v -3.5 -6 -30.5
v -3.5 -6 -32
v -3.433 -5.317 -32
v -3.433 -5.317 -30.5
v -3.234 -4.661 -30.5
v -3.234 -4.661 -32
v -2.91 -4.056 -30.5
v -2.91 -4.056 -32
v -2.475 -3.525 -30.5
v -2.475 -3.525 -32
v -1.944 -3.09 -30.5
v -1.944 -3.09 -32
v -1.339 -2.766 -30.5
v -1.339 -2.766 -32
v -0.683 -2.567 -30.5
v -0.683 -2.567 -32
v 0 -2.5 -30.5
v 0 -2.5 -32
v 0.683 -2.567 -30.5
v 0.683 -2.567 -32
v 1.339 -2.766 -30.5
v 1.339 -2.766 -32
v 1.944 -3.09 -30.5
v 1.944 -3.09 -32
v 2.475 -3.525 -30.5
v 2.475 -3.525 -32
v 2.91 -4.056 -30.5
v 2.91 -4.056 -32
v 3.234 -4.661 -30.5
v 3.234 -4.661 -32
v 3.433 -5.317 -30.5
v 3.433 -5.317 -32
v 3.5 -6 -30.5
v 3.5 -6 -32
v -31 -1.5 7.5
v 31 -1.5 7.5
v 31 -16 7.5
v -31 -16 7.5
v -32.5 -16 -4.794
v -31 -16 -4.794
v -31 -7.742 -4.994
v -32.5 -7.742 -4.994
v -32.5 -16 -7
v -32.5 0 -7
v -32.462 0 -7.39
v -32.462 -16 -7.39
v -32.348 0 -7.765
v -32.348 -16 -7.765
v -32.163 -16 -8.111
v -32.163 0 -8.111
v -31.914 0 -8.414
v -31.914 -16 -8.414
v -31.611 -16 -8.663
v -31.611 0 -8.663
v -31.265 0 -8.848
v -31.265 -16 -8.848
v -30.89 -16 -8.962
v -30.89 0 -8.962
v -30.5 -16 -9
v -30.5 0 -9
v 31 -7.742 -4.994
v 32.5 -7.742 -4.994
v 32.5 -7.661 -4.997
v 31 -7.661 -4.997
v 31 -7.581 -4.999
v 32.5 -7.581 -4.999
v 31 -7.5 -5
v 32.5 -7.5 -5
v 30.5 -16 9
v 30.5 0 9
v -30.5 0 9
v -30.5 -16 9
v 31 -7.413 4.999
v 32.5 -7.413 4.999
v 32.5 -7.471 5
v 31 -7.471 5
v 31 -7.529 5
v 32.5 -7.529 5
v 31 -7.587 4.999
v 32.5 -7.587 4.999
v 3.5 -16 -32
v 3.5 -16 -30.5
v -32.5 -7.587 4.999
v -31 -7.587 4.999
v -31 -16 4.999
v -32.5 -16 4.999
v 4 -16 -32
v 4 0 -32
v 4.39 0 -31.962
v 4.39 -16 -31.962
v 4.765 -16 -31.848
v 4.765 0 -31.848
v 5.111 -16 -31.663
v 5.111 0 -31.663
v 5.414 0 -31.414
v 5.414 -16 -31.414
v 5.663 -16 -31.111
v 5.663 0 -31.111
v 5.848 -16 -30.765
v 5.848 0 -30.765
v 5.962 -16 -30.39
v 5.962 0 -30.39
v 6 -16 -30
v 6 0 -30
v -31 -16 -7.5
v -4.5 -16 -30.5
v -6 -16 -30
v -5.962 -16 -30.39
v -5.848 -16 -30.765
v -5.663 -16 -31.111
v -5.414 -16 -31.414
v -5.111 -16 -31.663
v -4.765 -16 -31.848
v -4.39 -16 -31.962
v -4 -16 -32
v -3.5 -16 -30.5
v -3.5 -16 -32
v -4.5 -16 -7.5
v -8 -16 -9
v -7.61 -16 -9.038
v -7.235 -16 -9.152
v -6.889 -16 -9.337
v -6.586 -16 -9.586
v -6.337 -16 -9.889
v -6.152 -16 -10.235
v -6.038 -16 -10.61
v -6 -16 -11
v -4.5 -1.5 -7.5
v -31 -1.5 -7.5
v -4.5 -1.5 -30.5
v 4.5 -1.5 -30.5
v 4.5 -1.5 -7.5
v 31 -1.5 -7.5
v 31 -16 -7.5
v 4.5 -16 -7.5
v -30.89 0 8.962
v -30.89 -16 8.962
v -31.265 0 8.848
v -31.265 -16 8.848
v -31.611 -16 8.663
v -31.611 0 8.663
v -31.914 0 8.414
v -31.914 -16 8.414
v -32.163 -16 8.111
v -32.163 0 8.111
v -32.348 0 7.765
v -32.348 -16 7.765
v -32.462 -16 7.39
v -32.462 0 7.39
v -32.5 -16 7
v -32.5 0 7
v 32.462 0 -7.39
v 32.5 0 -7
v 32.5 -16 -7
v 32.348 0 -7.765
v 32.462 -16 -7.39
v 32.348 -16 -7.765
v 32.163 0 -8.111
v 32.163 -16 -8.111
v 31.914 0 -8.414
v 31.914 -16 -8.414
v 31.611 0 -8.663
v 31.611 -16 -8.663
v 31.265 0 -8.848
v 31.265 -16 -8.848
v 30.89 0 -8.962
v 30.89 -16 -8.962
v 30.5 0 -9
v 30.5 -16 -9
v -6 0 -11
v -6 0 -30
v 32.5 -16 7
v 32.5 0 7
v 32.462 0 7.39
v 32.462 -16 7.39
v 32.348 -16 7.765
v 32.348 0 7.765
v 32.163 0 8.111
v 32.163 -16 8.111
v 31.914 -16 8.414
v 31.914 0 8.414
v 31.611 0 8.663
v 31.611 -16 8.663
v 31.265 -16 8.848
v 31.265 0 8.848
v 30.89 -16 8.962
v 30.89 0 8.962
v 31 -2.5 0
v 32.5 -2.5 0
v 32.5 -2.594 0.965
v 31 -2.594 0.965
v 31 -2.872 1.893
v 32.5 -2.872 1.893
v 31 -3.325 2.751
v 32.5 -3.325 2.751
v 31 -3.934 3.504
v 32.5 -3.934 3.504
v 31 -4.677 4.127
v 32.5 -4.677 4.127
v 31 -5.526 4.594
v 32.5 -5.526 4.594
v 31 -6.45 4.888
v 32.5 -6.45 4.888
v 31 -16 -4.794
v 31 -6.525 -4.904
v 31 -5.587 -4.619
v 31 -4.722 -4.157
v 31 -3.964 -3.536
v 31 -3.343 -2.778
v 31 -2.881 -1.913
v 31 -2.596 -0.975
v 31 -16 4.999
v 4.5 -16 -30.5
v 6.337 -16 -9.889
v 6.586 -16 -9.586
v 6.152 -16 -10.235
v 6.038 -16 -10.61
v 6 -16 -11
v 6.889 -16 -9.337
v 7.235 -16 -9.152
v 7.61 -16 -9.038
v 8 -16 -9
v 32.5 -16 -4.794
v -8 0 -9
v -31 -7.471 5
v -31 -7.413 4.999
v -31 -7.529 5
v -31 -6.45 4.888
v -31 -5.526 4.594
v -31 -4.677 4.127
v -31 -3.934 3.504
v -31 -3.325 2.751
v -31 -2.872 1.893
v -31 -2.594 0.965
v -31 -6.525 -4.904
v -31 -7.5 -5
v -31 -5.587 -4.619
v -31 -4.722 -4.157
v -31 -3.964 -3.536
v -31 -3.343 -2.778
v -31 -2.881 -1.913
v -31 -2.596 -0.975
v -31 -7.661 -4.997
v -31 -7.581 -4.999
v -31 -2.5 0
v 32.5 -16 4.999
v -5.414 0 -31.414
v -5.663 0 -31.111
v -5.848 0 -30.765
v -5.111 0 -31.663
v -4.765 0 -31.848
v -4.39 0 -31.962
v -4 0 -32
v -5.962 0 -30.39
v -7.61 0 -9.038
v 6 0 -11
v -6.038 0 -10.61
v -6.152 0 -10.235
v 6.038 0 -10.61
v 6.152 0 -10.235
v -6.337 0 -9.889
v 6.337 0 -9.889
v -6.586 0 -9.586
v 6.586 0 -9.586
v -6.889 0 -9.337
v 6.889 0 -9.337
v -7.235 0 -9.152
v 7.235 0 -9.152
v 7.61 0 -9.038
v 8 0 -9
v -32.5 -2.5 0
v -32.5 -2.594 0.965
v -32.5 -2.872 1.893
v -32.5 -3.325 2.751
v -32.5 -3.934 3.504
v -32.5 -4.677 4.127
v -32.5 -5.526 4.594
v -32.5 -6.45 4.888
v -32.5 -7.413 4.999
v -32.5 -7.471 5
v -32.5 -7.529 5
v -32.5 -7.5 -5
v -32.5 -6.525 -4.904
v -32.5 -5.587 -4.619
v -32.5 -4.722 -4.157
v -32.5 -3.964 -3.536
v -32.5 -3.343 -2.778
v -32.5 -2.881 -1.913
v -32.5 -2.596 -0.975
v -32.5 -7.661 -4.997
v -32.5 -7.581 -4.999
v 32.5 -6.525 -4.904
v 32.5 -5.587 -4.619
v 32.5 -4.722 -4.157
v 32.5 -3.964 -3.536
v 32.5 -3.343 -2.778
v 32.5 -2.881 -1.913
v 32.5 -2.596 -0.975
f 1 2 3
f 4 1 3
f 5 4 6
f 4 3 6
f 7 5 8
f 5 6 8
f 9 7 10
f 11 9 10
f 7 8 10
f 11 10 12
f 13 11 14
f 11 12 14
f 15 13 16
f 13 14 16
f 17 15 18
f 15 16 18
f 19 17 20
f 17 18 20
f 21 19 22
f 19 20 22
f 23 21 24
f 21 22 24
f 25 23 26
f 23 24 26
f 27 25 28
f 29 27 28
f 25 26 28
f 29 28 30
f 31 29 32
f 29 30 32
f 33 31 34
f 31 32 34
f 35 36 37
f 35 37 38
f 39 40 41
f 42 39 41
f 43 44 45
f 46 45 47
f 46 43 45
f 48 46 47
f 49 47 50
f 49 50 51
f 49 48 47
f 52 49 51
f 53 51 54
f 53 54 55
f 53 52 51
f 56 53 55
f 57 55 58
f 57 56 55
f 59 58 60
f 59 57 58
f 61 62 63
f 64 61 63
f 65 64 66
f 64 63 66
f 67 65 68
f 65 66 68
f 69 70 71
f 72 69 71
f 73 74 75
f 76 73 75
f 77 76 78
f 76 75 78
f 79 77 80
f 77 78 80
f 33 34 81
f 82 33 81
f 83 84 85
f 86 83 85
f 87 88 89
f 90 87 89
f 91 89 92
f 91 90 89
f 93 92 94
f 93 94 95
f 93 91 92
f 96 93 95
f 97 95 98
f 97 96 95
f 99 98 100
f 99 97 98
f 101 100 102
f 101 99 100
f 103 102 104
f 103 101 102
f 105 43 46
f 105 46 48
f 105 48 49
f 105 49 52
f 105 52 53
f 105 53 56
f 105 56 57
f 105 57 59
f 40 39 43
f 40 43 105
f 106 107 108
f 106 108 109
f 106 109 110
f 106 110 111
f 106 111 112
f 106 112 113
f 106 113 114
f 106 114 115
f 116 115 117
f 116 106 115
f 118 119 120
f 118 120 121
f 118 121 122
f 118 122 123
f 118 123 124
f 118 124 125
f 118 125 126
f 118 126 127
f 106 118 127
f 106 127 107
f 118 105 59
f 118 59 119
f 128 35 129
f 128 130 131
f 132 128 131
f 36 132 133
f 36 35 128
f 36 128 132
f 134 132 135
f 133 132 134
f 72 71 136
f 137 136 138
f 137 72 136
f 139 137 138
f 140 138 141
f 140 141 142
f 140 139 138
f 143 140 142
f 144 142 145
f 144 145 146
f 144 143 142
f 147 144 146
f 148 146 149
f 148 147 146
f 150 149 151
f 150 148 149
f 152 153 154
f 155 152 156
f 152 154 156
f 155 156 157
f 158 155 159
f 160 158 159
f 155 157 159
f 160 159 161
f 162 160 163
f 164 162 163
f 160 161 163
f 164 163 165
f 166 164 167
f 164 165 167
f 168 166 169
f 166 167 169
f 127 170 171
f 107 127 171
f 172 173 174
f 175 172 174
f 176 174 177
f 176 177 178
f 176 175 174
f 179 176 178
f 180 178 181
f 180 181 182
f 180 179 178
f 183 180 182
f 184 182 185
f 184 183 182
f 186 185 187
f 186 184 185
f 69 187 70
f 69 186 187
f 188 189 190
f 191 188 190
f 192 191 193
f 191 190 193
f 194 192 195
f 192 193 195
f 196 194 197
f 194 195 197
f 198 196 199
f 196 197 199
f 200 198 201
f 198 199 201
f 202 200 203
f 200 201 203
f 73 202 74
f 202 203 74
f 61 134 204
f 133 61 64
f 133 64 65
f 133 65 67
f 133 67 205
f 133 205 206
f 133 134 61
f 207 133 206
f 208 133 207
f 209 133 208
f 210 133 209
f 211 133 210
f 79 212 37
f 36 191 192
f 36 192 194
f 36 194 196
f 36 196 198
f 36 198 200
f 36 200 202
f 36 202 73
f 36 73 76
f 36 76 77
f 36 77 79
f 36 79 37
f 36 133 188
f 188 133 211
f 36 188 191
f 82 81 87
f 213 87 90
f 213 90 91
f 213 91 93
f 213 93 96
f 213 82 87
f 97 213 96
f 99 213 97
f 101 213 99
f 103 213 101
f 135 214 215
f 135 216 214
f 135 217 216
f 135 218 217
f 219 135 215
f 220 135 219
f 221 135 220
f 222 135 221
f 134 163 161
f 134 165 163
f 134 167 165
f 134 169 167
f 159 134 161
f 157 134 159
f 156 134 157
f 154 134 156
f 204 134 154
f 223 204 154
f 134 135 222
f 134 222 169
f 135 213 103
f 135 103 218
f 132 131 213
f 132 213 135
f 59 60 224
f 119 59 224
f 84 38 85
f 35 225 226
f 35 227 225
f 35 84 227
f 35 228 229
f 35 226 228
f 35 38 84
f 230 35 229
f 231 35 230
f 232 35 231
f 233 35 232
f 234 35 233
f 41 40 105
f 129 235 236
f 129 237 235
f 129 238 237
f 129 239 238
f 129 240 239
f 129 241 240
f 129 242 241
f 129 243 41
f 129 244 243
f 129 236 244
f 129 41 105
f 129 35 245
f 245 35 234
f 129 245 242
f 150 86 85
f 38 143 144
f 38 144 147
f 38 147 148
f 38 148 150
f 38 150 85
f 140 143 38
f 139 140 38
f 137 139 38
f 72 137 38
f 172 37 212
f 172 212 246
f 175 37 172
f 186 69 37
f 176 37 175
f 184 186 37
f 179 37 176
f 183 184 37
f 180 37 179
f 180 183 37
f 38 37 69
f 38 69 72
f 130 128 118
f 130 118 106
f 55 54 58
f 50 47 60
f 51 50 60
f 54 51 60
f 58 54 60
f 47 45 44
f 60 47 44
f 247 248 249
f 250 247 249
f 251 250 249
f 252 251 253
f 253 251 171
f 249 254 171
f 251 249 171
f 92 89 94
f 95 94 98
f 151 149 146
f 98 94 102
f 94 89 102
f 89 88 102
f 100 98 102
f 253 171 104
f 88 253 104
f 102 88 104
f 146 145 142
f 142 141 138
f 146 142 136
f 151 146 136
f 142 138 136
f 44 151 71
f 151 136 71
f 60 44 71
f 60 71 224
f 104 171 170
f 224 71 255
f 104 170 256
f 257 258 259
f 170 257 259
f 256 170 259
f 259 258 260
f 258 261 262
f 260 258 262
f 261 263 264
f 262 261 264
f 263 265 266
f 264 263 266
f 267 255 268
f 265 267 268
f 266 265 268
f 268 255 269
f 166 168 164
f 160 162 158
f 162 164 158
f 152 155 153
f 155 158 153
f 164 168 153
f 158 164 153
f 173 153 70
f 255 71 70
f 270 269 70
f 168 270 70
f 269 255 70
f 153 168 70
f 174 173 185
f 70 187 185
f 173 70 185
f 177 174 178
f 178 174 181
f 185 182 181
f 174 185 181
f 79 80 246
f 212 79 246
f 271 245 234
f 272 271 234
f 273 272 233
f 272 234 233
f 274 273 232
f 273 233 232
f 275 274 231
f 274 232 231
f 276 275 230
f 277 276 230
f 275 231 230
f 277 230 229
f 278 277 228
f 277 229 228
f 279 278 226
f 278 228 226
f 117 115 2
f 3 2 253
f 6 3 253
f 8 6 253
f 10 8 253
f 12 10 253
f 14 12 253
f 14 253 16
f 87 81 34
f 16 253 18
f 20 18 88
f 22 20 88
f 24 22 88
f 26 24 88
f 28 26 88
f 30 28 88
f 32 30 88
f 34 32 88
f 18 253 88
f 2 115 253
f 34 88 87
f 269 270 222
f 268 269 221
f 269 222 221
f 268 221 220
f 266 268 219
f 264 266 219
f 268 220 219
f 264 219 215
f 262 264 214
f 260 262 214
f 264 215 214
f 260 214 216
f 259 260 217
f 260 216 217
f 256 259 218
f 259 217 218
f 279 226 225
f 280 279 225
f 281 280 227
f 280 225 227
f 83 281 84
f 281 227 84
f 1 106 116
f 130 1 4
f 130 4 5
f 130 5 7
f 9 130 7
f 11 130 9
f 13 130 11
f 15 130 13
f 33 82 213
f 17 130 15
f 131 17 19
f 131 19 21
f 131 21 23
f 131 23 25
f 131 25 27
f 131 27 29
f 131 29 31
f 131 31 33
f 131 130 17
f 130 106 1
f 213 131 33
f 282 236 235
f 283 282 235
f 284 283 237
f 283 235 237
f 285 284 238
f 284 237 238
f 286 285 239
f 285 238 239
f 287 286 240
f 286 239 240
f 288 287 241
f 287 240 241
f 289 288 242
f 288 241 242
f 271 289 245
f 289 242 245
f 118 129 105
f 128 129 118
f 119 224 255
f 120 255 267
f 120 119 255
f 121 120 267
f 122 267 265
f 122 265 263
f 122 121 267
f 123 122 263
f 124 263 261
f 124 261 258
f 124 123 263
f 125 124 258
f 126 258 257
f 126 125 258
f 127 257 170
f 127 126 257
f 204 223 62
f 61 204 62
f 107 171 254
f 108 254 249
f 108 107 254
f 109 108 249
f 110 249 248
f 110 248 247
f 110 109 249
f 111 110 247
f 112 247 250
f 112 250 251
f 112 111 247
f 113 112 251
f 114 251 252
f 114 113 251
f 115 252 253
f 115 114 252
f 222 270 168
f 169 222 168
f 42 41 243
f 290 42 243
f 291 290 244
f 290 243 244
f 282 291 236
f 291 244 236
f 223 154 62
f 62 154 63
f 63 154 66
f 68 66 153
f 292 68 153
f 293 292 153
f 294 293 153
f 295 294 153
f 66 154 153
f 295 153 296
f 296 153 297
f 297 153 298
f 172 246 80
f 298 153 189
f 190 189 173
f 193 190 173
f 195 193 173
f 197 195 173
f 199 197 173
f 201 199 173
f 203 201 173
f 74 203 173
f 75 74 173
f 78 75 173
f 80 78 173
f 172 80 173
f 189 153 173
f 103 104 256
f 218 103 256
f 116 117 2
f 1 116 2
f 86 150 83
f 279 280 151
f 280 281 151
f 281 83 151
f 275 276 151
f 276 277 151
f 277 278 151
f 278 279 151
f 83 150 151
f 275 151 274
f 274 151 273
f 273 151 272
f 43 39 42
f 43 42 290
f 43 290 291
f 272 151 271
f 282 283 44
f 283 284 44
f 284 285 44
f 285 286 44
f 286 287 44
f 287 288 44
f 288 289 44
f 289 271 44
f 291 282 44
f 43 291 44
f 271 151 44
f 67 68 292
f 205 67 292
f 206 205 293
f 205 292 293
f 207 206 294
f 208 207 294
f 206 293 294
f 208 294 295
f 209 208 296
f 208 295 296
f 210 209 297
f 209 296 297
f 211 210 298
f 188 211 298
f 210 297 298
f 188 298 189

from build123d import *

# Parameters (mm, degrees)
F1_DEPTH = 16
F2_T     = -1.5
F4_DEPTH = 100
F6_DEPTH = 25
F7_R     = 2


with BuildPart() as f1:
    # F0 (on Front) → F1 (new body)
    with BuildSketch(Plane.XZ):
        Polygon((32.5, -9), (32.5, 9), (-32.5, 9), (-32.5, -9), (-6, -9), (-6, -32), (6, -32), (6, -9), align=None)
    extrude(amount=F1_DEPTH)

    # F2
    f2_openings = [f1.faces().sort_by_distance(p)[0] for p in [
        (0, -16, -3.912863),
    ]]
    offset(amount=F2_T, openings=f2_openings, kind=Kind.INTERSECTION)

    # F3 (on face) → F4 (cut)
    with BuildSketch(Plane.YZ.offset(32.5)):
        with BuildLine():
            ThreePointArc((-7.5, -5), (-3.9644660941, -3.5355339059), (-2.5, 0))
            ThreePointArc((-2.5, 0), (-3.9336885694, 3.5044860935), (-7.4125691119, 4.9992355255))
            Line((-7.4125691119, 4.9992355255), (-7.5874308881, 4.9992355255))
            ThreePointArc((-7.5874308881, 4.9992355255), (-12.4994020552, 0.0773245797), (-7.7419960904, -4.9941403557))
            Line((-7.7419960904, -4.9941403557), (-7.5, -5))
        make_face()
        with BuildLine():
            Line((-7.5874308881, 4.9992355255), (-7.4125691119, 4.9992355255))
            ThreePointArc((-7.4125691119, 4.9992355255), (-7.5, 5), (-7.5874308881, 4.9992355255))
        make_face()
        with BuildLine():
            ThreePointArc((-7.7419960904, -4.9941403557), (-7.6210335111, -4.9985348743), (-7.5, -5))
            Line((-7.5, -5), (-7.7419960904, -4.9941403557))
        make_face()
        with BuildLine():
            ThreePointArc((-7.7419960904, -4.9941403557), (-12.4994020552, 0.0773245797), (-7.5874308881, 4.9992355255))
            Line((-7.5874308881, 4.9992355255), (-16, 4.9992355255))
            Line((-16, 4.9992355255), (-16, -4.7941827215))
            Line((-16, -4.7941827215), (-7.7419960904, -4.9941403557))
        make_face()
    extrude(amount=-F4_DEPTH, mode=Mode.SUBTRACT)

    # F5 (on face) → F6 (cut)
    with BuildSketch(Plane(origin=(0, 0, -32), x_dir=(1, 0, 0), z_dir=(0, 0, -1))):
        with BuildLine():
            ThreePointArc((-3.5, 6), (0, 2.5), (3.5, 6))
            ThreePointArc((3.5, 6), (0, 9.5), (-3.5, 6))
        make_face()
        with BuildLine():
            ThreePointArc((-3.5, 6), (0, 9.5), (3.5, 6))
            Line((3.5, 6), (3.5, 16))
            Line((3.5, 16), (-3.5, 16))
            Line((-3.5, 16), (-3.5, 6))
        make_face()
    extrude(amount=-F6_DEPTH, mode=Mode.SUBTRACT)

    # F7
    f7_edges = [f1.edges().sort_by_distance(p)[0] for p in [
        (-32.5, -8, -9),
        (-6, -8, -9),
        (-6, -8, -32),
        (6, -8, -32),
        (6, -8, -9),
        (32.5, -8, -9),
        (32.5, -8, 9),
        (-32.5, -8, 9),
    ]]
    fillet(f7_edges, radius=F7_R)


solid = f1.part
